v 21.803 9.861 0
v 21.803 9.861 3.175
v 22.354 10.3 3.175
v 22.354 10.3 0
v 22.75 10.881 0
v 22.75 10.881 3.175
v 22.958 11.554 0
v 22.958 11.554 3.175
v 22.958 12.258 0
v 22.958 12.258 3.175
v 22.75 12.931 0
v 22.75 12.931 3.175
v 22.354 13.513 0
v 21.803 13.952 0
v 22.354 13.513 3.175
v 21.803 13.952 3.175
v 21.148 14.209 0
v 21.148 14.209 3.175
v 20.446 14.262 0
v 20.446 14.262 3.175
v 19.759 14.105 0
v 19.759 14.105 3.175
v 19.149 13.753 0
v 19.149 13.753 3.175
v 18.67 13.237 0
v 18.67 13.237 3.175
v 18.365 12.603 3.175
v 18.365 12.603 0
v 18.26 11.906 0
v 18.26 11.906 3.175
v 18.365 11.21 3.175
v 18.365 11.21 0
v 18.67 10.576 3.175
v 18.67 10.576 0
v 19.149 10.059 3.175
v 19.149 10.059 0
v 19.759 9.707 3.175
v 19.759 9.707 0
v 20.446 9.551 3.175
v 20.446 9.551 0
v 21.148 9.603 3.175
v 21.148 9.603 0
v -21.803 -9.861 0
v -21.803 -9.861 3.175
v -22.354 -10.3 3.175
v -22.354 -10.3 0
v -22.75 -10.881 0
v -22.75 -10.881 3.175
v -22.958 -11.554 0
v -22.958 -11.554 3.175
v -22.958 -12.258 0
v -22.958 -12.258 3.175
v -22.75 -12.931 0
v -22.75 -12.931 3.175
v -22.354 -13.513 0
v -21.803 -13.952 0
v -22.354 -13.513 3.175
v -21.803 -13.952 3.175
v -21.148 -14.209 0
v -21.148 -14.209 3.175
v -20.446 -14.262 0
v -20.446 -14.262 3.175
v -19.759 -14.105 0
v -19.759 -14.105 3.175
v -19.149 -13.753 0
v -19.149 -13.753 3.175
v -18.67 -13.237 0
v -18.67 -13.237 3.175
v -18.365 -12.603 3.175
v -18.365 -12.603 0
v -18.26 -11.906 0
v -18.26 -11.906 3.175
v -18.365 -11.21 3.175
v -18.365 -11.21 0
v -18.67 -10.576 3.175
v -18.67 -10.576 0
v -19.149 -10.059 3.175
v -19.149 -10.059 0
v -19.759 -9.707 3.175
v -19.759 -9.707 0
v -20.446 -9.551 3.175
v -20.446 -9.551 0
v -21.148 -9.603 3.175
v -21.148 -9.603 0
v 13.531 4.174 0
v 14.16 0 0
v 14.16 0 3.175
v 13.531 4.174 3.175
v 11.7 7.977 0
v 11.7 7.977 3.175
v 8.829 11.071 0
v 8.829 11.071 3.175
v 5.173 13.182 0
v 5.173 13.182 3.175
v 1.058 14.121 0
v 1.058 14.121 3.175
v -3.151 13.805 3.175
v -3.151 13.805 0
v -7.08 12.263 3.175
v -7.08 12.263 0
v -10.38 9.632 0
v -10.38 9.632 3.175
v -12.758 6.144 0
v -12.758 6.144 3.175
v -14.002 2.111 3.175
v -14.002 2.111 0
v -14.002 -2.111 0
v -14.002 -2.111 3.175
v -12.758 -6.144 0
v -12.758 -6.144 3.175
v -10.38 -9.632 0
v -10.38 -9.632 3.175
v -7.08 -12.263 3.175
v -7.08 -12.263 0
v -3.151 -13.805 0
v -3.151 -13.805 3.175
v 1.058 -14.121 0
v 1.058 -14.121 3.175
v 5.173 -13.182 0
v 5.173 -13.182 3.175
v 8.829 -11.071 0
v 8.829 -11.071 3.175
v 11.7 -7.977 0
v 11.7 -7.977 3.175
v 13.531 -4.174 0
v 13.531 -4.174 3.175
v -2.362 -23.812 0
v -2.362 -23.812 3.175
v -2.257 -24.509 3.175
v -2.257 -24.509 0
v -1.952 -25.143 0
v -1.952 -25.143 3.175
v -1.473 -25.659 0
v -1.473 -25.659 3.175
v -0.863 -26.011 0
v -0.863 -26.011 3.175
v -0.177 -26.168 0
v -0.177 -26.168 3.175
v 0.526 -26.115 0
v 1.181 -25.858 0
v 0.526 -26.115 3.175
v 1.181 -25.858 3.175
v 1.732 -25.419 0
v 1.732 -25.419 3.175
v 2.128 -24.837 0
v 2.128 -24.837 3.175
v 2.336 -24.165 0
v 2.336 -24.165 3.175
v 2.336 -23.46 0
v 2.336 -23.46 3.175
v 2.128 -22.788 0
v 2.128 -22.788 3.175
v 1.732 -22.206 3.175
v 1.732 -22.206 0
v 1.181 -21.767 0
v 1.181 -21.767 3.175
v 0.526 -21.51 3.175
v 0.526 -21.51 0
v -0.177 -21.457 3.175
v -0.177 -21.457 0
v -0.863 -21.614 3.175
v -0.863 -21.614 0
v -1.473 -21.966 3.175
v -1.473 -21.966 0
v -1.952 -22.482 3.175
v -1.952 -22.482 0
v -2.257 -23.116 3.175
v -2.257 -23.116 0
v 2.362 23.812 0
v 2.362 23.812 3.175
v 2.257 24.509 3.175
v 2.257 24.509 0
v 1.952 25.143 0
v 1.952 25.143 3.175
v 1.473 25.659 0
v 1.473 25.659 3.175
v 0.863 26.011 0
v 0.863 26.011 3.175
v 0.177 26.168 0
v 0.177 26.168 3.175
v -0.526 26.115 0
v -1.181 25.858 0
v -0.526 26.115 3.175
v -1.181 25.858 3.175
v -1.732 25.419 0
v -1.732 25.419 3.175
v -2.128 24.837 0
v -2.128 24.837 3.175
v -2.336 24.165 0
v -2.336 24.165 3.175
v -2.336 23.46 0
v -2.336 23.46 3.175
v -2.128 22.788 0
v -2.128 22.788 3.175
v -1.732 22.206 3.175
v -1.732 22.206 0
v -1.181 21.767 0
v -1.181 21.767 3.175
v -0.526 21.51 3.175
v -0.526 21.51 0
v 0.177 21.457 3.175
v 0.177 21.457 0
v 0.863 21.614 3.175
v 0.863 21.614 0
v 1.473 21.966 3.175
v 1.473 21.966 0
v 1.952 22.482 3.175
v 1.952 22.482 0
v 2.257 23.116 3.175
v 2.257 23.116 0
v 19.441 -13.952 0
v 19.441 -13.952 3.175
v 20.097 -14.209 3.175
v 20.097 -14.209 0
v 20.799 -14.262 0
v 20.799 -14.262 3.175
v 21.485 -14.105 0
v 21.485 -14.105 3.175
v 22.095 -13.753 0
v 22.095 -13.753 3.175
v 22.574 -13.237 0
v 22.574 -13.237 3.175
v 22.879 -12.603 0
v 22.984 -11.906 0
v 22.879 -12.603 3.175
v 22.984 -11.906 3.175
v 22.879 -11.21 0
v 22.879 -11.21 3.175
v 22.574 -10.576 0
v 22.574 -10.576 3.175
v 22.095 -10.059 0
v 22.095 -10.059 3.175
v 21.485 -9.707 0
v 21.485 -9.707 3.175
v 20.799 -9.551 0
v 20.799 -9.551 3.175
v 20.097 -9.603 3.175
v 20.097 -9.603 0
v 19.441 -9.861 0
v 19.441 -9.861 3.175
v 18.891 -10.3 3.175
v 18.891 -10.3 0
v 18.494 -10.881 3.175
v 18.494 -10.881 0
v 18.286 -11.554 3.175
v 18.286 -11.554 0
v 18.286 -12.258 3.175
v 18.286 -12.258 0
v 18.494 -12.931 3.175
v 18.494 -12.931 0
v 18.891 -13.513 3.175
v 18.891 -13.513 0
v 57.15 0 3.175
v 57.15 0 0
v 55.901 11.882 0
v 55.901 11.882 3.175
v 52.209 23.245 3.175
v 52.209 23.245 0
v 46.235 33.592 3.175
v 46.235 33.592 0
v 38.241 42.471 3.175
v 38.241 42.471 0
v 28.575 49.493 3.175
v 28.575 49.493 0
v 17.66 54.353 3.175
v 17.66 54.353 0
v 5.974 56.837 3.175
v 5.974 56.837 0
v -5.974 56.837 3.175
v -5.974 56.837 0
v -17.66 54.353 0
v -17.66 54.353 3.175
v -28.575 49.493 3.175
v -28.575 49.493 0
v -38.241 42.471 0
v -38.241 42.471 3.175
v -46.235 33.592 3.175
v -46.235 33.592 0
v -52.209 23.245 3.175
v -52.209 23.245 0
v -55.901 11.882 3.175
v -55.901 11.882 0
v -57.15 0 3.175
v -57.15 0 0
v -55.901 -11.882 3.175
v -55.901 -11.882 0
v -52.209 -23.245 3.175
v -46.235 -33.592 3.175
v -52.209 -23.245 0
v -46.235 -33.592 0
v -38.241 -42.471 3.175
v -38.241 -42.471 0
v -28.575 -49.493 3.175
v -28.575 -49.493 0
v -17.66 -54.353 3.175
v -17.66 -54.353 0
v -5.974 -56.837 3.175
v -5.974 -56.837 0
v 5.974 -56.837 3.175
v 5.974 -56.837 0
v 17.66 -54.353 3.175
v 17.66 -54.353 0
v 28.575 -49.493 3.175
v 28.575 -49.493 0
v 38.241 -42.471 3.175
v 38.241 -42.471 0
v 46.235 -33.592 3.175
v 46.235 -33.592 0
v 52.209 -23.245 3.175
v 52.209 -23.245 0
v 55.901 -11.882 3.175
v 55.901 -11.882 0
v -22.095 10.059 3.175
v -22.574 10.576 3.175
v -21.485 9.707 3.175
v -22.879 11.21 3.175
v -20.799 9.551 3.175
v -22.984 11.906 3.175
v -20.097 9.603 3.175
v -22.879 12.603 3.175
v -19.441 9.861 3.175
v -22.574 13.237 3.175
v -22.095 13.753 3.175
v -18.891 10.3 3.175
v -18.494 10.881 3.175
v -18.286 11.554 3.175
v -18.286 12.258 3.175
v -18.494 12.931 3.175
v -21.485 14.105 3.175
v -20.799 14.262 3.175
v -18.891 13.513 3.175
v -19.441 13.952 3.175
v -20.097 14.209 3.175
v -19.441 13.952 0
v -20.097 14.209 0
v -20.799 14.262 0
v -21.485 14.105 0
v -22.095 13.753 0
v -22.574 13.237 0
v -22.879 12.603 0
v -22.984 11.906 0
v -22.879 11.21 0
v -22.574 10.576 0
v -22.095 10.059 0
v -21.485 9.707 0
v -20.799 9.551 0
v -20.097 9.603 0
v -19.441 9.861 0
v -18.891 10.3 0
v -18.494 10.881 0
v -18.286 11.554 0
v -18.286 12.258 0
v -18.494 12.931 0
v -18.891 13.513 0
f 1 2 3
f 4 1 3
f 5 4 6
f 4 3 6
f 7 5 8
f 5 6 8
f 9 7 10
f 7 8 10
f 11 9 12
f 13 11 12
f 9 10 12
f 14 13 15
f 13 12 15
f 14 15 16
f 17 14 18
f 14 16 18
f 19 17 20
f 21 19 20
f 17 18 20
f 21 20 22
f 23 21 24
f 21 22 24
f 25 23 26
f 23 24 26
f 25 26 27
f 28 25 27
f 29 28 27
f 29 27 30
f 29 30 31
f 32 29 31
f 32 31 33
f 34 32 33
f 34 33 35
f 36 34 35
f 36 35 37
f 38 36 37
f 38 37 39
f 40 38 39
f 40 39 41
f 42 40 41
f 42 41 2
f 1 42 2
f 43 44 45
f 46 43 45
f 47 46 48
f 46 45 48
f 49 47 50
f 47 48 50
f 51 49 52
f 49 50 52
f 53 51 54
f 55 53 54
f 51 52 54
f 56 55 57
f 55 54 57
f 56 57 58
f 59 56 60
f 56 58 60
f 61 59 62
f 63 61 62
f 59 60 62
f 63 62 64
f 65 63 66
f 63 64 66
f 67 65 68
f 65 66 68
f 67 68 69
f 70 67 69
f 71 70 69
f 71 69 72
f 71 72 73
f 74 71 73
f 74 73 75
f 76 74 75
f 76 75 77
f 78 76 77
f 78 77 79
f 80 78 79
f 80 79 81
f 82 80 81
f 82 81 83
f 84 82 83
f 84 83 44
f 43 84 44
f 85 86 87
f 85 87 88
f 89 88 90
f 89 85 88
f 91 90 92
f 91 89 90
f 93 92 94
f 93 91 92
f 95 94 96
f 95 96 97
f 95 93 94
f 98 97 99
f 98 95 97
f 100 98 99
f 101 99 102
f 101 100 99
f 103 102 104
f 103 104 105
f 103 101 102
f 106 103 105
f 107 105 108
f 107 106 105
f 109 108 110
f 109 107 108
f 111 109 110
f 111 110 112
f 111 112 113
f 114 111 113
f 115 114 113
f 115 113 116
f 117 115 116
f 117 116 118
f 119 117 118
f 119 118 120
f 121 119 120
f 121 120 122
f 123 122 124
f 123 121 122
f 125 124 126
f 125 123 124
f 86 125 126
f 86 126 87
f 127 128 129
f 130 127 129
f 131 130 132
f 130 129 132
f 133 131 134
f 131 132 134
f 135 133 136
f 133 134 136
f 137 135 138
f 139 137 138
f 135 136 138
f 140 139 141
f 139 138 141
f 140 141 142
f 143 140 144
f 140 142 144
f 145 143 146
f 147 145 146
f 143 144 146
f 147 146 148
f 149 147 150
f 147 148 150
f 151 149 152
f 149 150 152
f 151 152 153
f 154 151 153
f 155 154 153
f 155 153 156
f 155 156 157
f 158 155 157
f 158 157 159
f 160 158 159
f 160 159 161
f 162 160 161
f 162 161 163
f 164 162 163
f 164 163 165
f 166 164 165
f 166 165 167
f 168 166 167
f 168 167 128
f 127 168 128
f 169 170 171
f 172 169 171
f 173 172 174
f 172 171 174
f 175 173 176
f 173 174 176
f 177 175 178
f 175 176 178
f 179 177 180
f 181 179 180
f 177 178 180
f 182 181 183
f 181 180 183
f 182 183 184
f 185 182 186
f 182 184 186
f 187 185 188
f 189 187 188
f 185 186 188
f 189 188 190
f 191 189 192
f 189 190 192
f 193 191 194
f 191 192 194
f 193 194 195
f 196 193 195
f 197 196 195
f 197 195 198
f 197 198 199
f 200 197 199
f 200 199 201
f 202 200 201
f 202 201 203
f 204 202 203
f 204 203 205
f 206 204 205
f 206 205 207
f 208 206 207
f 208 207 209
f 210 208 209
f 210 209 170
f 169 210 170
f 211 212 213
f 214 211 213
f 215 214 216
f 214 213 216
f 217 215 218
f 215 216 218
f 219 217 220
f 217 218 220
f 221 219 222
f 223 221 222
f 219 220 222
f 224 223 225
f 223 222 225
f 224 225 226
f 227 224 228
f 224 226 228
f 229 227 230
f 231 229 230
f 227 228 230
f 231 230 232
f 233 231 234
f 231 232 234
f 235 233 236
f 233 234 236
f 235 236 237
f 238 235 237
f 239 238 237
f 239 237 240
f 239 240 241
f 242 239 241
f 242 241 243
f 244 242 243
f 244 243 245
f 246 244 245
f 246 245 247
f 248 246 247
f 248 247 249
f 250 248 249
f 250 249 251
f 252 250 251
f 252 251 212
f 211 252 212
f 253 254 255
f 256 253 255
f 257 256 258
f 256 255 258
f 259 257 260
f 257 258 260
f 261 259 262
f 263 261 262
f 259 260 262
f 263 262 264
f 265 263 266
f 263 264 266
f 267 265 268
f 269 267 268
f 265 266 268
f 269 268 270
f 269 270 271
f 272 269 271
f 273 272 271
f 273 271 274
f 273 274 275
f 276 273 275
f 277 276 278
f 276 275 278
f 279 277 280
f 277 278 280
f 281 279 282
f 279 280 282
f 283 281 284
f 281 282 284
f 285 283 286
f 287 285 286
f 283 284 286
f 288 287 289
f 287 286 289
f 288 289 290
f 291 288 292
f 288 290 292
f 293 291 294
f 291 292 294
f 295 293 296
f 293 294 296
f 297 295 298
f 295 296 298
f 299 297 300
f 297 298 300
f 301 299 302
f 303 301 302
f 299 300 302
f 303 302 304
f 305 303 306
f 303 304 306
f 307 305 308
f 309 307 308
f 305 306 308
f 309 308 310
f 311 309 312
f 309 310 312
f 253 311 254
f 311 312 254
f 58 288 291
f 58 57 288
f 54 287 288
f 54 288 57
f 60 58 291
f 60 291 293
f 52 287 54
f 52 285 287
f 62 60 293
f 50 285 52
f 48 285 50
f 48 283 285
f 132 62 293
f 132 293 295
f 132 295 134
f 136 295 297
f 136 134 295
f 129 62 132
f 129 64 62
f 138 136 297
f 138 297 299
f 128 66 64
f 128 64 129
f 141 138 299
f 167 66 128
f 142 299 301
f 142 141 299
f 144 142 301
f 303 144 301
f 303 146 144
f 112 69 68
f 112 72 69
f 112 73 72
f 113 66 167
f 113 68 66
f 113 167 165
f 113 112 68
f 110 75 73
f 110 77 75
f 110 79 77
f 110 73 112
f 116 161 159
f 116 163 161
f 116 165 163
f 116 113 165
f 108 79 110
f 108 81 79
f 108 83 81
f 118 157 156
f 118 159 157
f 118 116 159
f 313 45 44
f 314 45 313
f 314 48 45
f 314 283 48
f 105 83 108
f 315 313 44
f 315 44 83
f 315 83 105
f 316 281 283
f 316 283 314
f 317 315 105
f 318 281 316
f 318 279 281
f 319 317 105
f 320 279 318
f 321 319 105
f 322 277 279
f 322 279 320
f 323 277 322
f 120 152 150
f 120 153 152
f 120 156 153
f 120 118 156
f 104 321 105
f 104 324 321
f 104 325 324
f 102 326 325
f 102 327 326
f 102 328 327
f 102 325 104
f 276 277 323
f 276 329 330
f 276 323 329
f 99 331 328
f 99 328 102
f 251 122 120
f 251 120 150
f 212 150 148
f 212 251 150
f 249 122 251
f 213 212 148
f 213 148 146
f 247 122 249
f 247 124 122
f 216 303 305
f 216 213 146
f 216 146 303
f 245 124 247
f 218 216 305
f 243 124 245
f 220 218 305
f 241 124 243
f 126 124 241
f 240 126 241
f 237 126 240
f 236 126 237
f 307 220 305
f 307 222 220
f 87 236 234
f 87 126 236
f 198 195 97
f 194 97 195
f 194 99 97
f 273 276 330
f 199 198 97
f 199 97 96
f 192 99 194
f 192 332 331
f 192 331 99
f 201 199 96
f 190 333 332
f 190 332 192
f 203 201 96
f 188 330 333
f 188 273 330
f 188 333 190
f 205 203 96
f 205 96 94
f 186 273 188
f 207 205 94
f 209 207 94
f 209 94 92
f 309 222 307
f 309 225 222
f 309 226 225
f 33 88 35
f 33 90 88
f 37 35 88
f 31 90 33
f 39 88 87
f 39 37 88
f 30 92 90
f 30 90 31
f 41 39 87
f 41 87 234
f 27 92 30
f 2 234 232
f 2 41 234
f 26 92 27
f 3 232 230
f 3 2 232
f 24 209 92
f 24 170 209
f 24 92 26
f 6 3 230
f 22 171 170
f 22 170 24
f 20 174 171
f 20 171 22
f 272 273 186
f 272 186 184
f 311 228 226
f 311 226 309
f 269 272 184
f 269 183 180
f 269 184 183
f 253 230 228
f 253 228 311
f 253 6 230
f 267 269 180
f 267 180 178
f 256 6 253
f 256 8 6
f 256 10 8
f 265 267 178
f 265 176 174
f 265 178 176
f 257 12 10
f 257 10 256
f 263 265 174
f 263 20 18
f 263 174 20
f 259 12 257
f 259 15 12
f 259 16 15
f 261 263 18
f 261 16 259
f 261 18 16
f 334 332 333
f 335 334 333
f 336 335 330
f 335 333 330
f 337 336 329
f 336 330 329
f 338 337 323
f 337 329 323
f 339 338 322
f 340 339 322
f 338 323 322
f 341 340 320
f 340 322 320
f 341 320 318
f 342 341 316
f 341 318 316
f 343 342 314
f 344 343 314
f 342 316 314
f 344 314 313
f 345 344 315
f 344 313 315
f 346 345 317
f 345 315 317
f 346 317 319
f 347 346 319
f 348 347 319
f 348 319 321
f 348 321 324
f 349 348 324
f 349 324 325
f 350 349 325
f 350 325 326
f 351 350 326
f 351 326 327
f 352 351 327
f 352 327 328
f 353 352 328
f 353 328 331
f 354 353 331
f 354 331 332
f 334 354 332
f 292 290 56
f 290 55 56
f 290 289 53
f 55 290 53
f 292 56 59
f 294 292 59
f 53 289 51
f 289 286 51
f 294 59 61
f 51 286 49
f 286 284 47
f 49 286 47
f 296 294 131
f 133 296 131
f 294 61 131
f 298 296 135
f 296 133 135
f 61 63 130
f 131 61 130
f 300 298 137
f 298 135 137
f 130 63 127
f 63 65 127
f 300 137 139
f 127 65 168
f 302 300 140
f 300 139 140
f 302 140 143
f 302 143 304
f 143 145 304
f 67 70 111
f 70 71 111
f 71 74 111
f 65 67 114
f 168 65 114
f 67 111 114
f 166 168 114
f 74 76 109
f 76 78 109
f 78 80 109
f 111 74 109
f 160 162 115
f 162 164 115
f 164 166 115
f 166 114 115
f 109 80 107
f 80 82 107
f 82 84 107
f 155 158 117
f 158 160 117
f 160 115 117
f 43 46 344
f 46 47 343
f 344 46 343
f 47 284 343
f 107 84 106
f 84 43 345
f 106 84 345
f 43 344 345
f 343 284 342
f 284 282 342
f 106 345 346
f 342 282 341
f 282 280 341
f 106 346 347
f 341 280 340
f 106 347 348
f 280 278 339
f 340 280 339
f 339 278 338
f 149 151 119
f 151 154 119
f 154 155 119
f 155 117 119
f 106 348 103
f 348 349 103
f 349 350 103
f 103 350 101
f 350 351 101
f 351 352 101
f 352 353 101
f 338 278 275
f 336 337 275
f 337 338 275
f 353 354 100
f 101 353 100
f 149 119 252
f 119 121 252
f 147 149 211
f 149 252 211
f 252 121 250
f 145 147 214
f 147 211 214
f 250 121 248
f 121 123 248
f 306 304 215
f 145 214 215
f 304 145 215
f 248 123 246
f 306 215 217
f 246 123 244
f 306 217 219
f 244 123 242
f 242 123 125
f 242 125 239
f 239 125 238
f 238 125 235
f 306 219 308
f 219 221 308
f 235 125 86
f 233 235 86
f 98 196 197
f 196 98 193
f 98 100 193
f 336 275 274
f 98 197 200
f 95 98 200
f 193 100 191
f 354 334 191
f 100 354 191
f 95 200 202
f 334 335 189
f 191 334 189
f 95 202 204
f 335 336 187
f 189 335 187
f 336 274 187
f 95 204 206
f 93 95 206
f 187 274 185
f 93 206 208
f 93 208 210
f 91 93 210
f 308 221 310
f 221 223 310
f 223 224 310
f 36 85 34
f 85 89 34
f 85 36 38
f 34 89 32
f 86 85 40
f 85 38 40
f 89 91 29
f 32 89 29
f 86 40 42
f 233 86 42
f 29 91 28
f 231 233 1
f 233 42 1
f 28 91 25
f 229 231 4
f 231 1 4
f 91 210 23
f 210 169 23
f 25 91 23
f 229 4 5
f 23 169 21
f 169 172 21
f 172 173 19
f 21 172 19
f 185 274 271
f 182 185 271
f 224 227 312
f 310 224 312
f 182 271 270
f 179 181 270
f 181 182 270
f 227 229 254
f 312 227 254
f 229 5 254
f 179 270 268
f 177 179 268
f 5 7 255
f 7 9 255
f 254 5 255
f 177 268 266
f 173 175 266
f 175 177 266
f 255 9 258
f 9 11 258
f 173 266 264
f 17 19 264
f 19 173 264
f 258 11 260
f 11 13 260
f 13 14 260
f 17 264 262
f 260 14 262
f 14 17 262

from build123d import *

# Parameters (mm, degrees)
F0_R            = 57.15
F0_R_2          = 14.1605
F1_DEPTH        = 3.175
F2_R            = 2.3622
F3_DEPTH        = 3.176
F3_COPIES_COUNT = 6


# Not quite as in the source:
# - a pattern or mirror of a feature is missing from the dataset's text; its kind, count and spacing are read off the source's solid


with BuildPart() as f1:
    # F0 (on Top) → F1 (new body)
    with BuildSketch(Plane.XY):
        Circle(F0_R)
        Circle(F0_R_2, mode=Mode.SUBTRACT)
    extrude(amount=F1_DEPTH)

    # F2 (on face) → F3 (cut, through all)
    with BuildSketch(Plane.XY.offset(3.175)):
        with Locations((0, 23.8125)):
            Circle(F2_R)
    f3 = extrude(amount=-F3_DEPTH, mode=Mode.SUBTRACT)

    # F3_copies: F3 ×6 about axis
    f3_copies_axis = Axis((0, 0, 0), (0, 0, 1))
    for i in range(1, F3_COPIES_COUNT):
        add(f3.rotate(f3_copies_axis, i * 360 / F3_COPIES_COUNT), mode=Mode.SUBTRACT)


solid = f1.part
